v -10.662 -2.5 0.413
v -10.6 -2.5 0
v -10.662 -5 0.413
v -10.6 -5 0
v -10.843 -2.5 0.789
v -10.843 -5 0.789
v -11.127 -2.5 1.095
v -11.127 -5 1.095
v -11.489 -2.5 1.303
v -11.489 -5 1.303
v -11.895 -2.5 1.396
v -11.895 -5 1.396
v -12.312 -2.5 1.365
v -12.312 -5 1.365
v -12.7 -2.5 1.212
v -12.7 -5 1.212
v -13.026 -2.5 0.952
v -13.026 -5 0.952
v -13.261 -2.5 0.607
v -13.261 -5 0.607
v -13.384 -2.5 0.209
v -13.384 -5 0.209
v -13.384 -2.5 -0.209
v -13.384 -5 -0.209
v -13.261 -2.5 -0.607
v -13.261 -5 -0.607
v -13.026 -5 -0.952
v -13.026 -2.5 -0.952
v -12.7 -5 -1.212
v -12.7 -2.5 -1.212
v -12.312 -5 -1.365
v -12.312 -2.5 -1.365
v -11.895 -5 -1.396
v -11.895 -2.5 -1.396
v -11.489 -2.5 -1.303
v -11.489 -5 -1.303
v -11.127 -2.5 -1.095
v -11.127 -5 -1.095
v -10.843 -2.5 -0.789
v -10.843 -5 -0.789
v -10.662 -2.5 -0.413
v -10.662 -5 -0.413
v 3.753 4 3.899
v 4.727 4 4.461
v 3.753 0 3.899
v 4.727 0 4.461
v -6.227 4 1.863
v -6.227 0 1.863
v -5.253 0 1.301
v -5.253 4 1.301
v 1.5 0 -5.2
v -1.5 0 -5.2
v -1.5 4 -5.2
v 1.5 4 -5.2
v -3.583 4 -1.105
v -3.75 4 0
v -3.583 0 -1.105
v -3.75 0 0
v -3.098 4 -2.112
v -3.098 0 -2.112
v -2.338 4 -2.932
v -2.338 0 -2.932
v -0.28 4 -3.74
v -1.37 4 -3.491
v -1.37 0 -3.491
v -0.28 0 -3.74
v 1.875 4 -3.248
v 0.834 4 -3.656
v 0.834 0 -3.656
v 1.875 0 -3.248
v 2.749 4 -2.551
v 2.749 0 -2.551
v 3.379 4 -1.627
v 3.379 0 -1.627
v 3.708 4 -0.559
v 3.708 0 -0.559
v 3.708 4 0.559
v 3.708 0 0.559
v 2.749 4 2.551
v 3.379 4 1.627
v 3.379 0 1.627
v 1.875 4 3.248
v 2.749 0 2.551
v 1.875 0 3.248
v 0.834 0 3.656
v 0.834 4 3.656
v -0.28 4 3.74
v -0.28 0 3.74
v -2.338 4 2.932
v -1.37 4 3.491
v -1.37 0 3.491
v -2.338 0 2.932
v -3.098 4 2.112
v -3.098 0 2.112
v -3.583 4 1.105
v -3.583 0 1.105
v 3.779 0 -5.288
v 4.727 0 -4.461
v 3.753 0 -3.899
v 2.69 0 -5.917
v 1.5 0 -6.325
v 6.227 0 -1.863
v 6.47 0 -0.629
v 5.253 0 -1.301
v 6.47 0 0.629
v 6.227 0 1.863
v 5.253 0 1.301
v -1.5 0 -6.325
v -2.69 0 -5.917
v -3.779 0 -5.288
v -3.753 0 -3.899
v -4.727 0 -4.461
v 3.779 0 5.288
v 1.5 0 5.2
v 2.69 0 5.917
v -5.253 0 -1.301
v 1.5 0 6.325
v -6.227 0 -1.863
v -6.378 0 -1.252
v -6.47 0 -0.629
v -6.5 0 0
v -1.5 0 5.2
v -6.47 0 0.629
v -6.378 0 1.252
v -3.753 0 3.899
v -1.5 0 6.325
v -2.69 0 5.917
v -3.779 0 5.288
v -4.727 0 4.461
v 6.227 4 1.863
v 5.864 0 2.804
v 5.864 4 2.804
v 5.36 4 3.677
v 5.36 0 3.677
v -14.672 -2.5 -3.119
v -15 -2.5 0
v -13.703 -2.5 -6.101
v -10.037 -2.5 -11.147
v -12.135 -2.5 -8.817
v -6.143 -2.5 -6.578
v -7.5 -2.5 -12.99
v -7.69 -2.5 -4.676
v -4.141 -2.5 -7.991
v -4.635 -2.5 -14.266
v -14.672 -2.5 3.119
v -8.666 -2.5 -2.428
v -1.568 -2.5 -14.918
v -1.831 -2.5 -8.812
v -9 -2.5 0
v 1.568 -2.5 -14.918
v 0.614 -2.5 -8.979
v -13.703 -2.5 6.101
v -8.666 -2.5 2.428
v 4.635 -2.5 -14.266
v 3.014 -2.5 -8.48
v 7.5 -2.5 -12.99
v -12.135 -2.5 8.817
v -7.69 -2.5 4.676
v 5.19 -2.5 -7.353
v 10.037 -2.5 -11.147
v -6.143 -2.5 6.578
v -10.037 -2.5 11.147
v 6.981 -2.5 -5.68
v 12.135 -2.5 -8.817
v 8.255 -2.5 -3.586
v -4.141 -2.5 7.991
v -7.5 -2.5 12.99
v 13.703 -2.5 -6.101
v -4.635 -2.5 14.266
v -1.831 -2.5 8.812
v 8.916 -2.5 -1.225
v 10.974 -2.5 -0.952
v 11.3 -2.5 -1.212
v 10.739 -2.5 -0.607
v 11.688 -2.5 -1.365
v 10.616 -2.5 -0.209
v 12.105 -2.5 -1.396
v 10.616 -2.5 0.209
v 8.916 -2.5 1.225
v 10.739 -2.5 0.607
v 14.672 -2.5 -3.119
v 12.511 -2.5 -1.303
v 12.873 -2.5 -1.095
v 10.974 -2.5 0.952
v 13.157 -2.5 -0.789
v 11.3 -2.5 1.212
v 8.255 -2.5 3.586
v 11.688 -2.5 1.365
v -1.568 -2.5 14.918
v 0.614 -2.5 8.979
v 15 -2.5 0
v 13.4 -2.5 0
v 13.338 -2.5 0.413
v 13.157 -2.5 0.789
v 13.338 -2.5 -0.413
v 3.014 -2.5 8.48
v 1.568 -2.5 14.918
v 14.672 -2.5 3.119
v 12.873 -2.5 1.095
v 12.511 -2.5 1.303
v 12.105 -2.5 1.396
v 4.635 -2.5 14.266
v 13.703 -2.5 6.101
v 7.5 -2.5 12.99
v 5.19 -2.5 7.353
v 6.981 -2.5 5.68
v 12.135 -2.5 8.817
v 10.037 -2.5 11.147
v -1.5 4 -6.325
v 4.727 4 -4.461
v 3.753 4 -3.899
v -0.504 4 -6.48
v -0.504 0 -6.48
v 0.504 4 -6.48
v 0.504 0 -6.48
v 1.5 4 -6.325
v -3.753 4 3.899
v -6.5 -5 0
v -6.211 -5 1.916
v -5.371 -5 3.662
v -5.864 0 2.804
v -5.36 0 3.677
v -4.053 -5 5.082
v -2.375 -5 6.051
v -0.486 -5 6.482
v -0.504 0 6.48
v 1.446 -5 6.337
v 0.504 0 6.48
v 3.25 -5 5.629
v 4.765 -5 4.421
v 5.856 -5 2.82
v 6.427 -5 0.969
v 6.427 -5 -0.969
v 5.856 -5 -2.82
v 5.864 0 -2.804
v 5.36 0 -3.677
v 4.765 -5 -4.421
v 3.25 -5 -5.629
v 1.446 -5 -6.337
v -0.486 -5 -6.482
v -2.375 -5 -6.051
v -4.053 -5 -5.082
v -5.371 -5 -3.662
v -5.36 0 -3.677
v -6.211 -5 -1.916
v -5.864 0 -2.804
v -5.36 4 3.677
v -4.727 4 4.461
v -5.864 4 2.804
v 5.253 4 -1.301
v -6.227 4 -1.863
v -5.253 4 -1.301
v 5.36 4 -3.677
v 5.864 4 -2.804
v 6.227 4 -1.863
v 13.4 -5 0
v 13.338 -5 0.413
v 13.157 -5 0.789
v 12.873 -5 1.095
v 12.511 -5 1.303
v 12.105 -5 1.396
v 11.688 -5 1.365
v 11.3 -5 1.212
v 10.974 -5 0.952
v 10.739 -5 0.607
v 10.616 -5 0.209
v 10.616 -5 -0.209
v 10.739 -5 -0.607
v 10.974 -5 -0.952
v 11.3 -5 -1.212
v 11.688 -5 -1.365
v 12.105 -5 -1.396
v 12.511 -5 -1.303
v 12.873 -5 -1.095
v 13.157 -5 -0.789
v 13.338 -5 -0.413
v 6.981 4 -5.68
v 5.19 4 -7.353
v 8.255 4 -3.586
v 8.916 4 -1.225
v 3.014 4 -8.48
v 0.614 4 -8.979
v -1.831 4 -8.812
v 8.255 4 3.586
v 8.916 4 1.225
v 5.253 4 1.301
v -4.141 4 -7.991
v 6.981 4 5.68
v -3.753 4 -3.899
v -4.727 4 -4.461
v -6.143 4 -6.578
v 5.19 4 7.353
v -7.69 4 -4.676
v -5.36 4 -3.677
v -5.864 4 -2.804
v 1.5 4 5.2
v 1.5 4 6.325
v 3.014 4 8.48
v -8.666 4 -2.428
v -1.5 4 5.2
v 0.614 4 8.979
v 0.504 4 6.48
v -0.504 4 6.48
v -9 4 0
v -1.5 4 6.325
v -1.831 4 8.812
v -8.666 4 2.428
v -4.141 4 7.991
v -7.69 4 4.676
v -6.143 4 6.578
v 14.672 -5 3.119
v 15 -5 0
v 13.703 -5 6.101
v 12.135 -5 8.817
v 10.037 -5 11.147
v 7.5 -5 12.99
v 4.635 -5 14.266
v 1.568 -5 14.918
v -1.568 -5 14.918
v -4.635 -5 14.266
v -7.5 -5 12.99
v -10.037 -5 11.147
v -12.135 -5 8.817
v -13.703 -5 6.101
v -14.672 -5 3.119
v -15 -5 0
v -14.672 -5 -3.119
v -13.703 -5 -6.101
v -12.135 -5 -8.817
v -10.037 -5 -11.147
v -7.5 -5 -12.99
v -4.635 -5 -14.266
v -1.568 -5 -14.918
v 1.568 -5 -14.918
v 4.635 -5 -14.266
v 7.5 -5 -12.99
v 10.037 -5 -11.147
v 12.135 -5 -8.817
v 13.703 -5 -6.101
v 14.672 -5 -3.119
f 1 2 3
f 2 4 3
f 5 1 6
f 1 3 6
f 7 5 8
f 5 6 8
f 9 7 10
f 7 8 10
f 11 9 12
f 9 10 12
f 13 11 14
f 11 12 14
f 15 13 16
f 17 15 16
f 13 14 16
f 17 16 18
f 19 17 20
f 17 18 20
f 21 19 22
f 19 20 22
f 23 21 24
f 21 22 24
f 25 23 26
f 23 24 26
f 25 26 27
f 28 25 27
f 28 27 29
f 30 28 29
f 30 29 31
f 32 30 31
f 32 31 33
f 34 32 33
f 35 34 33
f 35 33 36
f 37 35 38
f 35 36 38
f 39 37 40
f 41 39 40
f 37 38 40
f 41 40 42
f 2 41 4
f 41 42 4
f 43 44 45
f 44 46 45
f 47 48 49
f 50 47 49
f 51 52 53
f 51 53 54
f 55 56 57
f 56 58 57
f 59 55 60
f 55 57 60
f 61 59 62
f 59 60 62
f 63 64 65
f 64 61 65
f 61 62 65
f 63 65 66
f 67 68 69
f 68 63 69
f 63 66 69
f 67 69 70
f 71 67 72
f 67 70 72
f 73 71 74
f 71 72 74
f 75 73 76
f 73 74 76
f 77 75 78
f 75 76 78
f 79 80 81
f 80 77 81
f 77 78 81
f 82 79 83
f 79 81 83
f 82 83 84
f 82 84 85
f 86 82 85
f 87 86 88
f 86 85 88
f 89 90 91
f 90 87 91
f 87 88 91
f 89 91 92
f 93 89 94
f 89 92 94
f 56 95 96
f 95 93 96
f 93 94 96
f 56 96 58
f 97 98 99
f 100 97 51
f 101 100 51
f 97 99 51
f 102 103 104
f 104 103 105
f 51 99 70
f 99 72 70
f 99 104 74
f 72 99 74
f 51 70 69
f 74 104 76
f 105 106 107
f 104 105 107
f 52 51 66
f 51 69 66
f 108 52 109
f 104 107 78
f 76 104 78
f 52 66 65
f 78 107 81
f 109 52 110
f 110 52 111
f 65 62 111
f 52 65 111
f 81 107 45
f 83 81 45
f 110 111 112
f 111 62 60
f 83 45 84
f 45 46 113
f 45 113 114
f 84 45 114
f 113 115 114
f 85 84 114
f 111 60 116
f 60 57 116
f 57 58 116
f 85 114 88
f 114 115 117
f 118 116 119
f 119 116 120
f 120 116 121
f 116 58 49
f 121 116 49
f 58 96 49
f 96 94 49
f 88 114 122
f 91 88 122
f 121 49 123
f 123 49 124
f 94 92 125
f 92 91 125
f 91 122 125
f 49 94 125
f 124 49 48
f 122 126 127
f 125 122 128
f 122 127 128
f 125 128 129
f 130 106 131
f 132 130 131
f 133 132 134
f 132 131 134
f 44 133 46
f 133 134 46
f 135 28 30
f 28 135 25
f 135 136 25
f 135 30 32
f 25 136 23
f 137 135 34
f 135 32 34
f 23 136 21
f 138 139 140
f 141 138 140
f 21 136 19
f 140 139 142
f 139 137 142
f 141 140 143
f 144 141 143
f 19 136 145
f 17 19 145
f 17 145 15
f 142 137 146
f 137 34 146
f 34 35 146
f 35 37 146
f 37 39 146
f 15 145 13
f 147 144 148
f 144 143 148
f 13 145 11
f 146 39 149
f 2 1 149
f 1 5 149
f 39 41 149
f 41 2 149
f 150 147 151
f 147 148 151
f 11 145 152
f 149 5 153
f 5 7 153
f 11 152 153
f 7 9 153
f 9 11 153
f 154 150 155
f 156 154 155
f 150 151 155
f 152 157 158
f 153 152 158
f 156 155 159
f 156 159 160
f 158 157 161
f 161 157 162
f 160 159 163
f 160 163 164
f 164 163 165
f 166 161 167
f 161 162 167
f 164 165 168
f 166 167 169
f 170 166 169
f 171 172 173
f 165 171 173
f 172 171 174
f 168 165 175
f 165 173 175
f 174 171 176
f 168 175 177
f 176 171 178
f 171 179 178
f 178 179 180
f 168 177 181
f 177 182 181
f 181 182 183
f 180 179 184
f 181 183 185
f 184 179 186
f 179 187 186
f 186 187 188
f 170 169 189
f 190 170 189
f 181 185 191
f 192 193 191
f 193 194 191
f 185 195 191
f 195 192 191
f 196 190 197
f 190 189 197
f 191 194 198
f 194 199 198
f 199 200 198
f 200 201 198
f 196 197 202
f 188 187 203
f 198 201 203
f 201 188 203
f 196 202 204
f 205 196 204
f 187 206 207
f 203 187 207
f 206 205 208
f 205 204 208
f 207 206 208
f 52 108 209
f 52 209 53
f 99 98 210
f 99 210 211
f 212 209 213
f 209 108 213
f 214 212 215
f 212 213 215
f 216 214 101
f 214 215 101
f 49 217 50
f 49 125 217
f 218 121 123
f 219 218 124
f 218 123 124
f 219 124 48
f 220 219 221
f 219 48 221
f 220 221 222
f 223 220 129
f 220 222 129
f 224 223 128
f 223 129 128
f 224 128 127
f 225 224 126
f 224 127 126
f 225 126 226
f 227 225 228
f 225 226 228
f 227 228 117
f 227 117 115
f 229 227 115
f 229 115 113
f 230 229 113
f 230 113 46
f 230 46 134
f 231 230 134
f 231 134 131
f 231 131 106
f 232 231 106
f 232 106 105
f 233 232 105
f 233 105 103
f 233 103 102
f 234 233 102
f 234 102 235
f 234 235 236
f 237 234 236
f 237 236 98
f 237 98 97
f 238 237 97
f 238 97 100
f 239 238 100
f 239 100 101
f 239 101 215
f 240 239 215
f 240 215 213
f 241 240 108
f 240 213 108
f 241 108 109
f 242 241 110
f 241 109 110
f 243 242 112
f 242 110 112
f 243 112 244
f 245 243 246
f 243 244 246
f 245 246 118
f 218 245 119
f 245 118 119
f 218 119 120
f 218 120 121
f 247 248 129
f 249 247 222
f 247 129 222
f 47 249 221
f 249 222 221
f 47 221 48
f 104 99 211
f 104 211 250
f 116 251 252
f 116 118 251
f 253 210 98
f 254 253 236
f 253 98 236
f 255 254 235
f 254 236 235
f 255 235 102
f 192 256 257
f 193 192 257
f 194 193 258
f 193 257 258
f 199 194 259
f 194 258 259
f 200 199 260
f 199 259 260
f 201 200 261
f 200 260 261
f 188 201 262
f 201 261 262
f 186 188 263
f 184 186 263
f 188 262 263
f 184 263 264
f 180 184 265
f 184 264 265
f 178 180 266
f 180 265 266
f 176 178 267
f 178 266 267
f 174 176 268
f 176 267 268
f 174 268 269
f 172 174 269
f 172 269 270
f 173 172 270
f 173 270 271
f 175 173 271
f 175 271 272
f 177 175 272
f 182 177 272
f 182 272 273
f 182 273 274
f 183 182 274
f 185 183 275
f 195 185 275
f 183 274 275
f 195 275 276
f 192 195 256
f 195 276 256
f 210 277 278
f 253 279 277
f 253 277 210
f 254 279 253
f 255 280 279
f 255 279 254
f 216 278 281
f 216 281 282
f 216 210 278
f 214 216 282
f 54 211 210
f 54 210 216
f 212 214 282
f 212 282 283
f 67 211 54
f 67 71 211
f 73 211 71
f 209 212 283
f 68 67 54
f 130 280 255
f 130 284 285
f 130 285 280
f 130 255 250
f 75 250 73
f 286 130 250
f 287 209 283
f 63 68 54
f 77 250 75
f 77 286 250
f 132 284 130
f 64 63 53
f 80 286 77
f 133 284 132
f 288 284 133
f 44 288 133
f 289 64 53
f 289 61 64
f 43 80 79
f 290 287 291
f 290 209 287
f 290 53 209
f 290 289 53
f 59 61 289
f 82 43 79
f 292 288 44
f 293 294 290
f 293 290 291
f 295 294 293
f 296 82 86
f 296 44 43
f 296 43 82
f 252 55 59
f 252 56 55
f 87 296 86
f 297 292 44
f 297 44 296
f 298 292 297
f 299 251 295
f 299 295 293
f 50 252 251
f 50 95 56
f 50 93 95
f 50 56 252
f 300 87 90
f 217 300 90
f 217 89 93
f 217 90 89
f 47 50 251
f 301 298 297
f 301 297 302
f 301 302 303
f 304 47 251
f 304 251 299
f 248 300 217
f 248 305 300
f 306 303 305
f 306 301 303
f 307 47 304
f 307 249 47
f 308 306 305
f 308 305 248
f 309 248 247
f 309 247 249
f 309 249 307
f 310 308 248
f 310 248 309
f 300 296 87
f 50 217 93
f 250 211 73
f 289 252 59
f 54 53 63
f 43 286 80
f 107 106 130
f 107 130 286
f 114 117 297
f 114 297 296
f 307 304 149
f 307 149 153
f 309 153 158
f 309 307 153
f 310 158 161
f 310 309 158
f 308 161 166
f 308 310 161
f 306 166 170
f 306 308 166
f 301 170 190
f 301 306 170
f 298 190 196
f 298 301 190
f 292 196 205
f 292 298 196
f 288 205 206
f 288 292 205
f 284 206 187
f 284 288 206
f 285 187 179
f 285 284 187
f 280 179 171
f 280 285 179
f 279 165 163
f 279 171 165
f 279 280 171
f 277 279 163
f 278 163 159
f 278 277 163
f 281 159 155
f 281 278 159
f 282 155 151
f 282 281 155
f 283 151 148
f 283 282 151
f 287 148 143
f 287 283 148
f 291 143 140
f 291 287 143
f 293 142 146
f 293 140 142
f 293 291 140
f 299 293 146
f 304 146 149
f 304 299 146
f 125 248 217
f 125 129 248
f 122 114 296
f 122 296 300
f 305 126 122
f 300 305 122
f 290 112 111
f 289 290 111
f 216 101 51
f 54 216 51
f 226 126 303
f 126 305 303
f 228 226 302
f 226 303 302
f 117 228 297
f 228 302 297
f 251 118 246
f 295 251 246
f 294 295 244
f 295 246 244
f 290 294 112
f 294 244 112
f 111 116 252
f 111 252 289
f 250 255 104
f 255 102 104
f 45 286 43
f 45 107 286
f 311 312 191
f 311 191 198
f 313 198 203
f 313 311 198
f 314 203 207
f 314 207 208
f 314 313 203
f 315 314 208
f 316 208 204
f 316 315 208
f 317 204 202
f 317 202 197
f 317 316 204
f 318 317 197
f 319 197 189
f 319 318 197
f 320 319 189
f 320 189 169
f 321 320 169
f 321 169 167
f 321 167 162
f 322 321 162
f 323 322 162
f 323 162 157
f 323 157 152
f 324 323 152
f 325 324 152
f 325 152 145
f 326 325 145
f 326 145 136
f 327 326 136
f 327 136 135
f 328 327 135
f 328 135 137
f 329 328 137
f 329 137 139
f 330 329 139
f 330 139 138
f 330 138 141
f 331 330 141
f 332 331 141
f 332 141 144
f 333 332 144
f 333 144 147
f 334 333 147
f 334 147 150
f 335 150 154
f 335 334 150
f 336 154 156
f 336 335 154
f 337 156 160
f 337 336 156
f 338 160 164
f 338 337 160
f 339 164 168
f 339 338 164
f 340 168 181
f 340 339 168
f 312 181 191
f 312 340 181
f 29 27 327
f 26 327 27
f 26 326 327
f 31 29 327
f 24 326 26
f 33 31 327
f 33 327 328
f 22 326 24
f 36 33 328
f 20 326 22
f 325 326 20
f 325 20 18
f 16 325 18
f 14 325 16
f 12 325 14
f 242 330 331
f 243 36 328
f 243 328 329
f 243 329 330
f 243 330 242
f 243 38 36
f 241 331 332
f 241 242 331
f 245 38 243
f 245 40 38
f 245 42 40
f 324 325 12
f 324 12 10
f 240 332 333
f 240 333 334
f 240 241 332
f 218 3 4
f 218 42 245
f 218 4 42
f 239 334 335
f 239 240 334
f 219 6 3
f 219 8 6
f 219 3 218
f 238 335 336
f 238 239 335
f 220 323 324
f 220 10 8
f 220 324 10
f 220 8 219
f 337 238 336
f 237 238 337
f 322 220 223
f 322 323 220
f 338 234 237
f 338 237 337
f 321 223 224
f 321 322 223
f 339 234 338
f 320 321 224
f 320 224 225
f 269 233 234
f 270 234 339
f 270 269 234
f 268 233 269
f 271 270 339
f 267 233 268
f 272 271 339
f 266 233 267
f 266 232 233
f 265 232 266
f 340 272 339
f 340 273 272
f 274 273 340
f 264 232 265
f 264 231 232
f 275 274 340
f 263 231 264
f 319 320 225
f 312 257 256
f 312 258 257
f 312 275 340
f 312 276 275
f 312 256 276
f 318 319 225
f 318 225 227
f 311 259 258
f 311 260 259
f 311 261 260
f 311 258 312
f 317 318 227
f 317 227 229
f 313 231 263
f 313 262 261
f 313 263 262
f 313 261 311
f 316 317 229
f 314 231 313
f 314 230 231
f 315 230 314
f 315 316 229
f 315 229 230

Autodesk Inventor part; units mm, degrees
ref_plane "YZ Plane" through (0, 0, 0) normal (1, 0, 0) x (0, 1, 0)
ref_plane "XZ Plane" through (0, 0, 0) normal (0, 1, 0) x (-1, 0, 0)
ref_plane "XY Plane" through (0, 0, 0) normal (0, 0, 1) x (1, 0, 0)
sketch "Sketch1" plane through (0, 0, 0) normal (0, 1, 0) x (-1, 0, 0)
  circle A0 centre (0, 0) radius 3.75
  circle A1 centre (0, 0) radius 6.5
  circle A2 centre (0, 0) radius 9
  dimension "d0" = 7.5
  dimension "d1" = 13
  dimension "d2" = 2.5
extrude "Extrusion1" add sketch "Sketch1" along normal blind 4 contours A1 | A2
extrude "Extrusion2" add sketch "Sketch1" against normal blind 5 contours A2
sketch "Sketch2" plane through (0, 0, 0) normal (0, -1, 0) x (1, 0, 0)
  circle A0 centre (0, 0) radius 6.5 projected
  circle A1 centre (0, 0) radius 3.75 projected
  circle A2 centre (0, 0) radius 9 projected
  circle A3 centre (0, 0) radius 6.5 projected
  line L0 (0, 6.5) -> (-1.5, 6.5)
  line L1 (-1.5, 6.5) -> (-1.5, 5.2)
  line L2 (-1.5, 5.2) -> (0, 5.2)
  line L3 (0, 5.2) -> (0, 6.5)
  line L4 (0, 6.5) -> (1.5, 6.5)
  line L5 (1.5, 6.5) -> (1.5, 5.2)
  line L6 (1.5, 5.2) -> (0, 5.2)
  arc A4 (1.5, 6.3246) -> (-1.5, 6.3246) centre (0, 0) ccw
  line L7 (-6.3792, 1.951) -> (-5.2533, 1.301)
  line L8 (-5.2533, 1.301) -> (-4.5033, 2.6)
  line L9 (-3.7533, 3.899) -> (-4.5033, 2.6)
  line L10 (-4.8792, 4.549) -> (-3.7533, 3.899)
  arc A5 (-4.7272, 4.4613) -> (-6.2272, 1.8632) centre (0, 0) ccw
  line L11 (-4.8792, -4.549) -> (-3.7533, -3.899)
  line L12 (-3.7533, -3.899) -> (-4.5033, -2.6)
  line L13 (-5.2533, -1.301) -> (-4.5033, -2.6)
  line L14 (-6.3792, -1.951) -> (-5.2533, -1.301)
  arc A6 (-6.2272, -1.8632) -> (-4.7272, -4.4613) centre (0, 0) ccw
  line L15 (1.5, -6.5) -> (1.5, -5.2)
  line L16 (1.5, -5.2) -> (0, -5.2)
  line L17 (-1.5, -5.2) -> (0, -5.2)
  line L18 (-1.5, -6.5) -> (-1.5, -5.2)
  arc A7 (-1.5, -6.3246) -> (1.5, -6.3246) centre (0, 0) ccw
  line L19 (6.3792, -1.951) -> (5.2533, -1.301)
  line L20 (5.2533, -1.301) -> (4.5033, -2.6)
  line L21 (3.7533, -3.899) -> (4.5033, -2.6)
  line L22 (4.8792, -4.549) -> (3.7533, -3.899)
  arc A8 (4.7272, -4.4613) -> (6.2272, -1.8632) centre (0, 0) ccw
  line L23 (4.8792, 4.549) -> (3.7533, 3.899)
  line L24 (3.7533, 3.899) -> (4.5033, 2.6)
  line L25 (5.2533, 1.301) -> (4.5033, 2.6)
  line L26 (6.3792, 1.951) -> (5.2533, 1.301)
  arc A9 (6.2272, 1.8632) -> (4.7272, 4.4613) centre (0, 0) ccw
  point P0 (-5.6292, 3.25)
  point P1 (-5.6292, -3.25)
  point P2 (0, -6.5)
  point P3 (5.6292, -3.25)
  point P4 (5.6292, 3.25)
  point P5 (-1.5, -6.3246)
  point P6 (1.5, -6.3246)
  point P7 (4.7272, -4.4613)
  point P8 (6.2272, -1.8632)
  point P9 (6.2272, 1.8632)
  point P10 (1.5, 6.3246)
  point P11 (-1.5, 6.3246)
  point P12 (-4.7272, 4.4613)
  point P13 (-6.2272, 1.8632)
  point P14 (-6.2272, -1.8632)
  dimension "d7" = 1.5
  dimension "d8" = 1.3
  dimension "d9" = 5.2
  dimension "d12" = 360
extrude "Extrusion3" cut sketch "Sketch2" against normal blind 4 contours L26 L25 L24 L23 A0 | A0 L22 L21 L20 L19 | L5 L6 L3 A0 | A0 L18 L17 L16 L15 | L3 L2 L1 A0 | A0 L14 L13 L12 L11 | L10 L9 L8 L7 A0
sketch "Sketch3" plane through (0, -5, 0) normal (0, -1, 0) x (1, 0, 0)
  circle A0 centre (0, 0) radius 15
  circle A1 centre (0, 0) radius 9 projected
  circle A2 centre (0, 0) radius 6.5 projected
  circle A3 centre (12, 0) radius 1.4
  circle A4 centre (-12, 0) radius 1.4
  dimension "d16" = 30
  dimension "d19" = 2.8
  dimension "d20" = 12
  dimension "d23" = 360
extrude "Extrusion4" add sketch "Sketch3" against normal blind 2.5 contours A0
properties part number "Potentiometer_Holder_Main"
